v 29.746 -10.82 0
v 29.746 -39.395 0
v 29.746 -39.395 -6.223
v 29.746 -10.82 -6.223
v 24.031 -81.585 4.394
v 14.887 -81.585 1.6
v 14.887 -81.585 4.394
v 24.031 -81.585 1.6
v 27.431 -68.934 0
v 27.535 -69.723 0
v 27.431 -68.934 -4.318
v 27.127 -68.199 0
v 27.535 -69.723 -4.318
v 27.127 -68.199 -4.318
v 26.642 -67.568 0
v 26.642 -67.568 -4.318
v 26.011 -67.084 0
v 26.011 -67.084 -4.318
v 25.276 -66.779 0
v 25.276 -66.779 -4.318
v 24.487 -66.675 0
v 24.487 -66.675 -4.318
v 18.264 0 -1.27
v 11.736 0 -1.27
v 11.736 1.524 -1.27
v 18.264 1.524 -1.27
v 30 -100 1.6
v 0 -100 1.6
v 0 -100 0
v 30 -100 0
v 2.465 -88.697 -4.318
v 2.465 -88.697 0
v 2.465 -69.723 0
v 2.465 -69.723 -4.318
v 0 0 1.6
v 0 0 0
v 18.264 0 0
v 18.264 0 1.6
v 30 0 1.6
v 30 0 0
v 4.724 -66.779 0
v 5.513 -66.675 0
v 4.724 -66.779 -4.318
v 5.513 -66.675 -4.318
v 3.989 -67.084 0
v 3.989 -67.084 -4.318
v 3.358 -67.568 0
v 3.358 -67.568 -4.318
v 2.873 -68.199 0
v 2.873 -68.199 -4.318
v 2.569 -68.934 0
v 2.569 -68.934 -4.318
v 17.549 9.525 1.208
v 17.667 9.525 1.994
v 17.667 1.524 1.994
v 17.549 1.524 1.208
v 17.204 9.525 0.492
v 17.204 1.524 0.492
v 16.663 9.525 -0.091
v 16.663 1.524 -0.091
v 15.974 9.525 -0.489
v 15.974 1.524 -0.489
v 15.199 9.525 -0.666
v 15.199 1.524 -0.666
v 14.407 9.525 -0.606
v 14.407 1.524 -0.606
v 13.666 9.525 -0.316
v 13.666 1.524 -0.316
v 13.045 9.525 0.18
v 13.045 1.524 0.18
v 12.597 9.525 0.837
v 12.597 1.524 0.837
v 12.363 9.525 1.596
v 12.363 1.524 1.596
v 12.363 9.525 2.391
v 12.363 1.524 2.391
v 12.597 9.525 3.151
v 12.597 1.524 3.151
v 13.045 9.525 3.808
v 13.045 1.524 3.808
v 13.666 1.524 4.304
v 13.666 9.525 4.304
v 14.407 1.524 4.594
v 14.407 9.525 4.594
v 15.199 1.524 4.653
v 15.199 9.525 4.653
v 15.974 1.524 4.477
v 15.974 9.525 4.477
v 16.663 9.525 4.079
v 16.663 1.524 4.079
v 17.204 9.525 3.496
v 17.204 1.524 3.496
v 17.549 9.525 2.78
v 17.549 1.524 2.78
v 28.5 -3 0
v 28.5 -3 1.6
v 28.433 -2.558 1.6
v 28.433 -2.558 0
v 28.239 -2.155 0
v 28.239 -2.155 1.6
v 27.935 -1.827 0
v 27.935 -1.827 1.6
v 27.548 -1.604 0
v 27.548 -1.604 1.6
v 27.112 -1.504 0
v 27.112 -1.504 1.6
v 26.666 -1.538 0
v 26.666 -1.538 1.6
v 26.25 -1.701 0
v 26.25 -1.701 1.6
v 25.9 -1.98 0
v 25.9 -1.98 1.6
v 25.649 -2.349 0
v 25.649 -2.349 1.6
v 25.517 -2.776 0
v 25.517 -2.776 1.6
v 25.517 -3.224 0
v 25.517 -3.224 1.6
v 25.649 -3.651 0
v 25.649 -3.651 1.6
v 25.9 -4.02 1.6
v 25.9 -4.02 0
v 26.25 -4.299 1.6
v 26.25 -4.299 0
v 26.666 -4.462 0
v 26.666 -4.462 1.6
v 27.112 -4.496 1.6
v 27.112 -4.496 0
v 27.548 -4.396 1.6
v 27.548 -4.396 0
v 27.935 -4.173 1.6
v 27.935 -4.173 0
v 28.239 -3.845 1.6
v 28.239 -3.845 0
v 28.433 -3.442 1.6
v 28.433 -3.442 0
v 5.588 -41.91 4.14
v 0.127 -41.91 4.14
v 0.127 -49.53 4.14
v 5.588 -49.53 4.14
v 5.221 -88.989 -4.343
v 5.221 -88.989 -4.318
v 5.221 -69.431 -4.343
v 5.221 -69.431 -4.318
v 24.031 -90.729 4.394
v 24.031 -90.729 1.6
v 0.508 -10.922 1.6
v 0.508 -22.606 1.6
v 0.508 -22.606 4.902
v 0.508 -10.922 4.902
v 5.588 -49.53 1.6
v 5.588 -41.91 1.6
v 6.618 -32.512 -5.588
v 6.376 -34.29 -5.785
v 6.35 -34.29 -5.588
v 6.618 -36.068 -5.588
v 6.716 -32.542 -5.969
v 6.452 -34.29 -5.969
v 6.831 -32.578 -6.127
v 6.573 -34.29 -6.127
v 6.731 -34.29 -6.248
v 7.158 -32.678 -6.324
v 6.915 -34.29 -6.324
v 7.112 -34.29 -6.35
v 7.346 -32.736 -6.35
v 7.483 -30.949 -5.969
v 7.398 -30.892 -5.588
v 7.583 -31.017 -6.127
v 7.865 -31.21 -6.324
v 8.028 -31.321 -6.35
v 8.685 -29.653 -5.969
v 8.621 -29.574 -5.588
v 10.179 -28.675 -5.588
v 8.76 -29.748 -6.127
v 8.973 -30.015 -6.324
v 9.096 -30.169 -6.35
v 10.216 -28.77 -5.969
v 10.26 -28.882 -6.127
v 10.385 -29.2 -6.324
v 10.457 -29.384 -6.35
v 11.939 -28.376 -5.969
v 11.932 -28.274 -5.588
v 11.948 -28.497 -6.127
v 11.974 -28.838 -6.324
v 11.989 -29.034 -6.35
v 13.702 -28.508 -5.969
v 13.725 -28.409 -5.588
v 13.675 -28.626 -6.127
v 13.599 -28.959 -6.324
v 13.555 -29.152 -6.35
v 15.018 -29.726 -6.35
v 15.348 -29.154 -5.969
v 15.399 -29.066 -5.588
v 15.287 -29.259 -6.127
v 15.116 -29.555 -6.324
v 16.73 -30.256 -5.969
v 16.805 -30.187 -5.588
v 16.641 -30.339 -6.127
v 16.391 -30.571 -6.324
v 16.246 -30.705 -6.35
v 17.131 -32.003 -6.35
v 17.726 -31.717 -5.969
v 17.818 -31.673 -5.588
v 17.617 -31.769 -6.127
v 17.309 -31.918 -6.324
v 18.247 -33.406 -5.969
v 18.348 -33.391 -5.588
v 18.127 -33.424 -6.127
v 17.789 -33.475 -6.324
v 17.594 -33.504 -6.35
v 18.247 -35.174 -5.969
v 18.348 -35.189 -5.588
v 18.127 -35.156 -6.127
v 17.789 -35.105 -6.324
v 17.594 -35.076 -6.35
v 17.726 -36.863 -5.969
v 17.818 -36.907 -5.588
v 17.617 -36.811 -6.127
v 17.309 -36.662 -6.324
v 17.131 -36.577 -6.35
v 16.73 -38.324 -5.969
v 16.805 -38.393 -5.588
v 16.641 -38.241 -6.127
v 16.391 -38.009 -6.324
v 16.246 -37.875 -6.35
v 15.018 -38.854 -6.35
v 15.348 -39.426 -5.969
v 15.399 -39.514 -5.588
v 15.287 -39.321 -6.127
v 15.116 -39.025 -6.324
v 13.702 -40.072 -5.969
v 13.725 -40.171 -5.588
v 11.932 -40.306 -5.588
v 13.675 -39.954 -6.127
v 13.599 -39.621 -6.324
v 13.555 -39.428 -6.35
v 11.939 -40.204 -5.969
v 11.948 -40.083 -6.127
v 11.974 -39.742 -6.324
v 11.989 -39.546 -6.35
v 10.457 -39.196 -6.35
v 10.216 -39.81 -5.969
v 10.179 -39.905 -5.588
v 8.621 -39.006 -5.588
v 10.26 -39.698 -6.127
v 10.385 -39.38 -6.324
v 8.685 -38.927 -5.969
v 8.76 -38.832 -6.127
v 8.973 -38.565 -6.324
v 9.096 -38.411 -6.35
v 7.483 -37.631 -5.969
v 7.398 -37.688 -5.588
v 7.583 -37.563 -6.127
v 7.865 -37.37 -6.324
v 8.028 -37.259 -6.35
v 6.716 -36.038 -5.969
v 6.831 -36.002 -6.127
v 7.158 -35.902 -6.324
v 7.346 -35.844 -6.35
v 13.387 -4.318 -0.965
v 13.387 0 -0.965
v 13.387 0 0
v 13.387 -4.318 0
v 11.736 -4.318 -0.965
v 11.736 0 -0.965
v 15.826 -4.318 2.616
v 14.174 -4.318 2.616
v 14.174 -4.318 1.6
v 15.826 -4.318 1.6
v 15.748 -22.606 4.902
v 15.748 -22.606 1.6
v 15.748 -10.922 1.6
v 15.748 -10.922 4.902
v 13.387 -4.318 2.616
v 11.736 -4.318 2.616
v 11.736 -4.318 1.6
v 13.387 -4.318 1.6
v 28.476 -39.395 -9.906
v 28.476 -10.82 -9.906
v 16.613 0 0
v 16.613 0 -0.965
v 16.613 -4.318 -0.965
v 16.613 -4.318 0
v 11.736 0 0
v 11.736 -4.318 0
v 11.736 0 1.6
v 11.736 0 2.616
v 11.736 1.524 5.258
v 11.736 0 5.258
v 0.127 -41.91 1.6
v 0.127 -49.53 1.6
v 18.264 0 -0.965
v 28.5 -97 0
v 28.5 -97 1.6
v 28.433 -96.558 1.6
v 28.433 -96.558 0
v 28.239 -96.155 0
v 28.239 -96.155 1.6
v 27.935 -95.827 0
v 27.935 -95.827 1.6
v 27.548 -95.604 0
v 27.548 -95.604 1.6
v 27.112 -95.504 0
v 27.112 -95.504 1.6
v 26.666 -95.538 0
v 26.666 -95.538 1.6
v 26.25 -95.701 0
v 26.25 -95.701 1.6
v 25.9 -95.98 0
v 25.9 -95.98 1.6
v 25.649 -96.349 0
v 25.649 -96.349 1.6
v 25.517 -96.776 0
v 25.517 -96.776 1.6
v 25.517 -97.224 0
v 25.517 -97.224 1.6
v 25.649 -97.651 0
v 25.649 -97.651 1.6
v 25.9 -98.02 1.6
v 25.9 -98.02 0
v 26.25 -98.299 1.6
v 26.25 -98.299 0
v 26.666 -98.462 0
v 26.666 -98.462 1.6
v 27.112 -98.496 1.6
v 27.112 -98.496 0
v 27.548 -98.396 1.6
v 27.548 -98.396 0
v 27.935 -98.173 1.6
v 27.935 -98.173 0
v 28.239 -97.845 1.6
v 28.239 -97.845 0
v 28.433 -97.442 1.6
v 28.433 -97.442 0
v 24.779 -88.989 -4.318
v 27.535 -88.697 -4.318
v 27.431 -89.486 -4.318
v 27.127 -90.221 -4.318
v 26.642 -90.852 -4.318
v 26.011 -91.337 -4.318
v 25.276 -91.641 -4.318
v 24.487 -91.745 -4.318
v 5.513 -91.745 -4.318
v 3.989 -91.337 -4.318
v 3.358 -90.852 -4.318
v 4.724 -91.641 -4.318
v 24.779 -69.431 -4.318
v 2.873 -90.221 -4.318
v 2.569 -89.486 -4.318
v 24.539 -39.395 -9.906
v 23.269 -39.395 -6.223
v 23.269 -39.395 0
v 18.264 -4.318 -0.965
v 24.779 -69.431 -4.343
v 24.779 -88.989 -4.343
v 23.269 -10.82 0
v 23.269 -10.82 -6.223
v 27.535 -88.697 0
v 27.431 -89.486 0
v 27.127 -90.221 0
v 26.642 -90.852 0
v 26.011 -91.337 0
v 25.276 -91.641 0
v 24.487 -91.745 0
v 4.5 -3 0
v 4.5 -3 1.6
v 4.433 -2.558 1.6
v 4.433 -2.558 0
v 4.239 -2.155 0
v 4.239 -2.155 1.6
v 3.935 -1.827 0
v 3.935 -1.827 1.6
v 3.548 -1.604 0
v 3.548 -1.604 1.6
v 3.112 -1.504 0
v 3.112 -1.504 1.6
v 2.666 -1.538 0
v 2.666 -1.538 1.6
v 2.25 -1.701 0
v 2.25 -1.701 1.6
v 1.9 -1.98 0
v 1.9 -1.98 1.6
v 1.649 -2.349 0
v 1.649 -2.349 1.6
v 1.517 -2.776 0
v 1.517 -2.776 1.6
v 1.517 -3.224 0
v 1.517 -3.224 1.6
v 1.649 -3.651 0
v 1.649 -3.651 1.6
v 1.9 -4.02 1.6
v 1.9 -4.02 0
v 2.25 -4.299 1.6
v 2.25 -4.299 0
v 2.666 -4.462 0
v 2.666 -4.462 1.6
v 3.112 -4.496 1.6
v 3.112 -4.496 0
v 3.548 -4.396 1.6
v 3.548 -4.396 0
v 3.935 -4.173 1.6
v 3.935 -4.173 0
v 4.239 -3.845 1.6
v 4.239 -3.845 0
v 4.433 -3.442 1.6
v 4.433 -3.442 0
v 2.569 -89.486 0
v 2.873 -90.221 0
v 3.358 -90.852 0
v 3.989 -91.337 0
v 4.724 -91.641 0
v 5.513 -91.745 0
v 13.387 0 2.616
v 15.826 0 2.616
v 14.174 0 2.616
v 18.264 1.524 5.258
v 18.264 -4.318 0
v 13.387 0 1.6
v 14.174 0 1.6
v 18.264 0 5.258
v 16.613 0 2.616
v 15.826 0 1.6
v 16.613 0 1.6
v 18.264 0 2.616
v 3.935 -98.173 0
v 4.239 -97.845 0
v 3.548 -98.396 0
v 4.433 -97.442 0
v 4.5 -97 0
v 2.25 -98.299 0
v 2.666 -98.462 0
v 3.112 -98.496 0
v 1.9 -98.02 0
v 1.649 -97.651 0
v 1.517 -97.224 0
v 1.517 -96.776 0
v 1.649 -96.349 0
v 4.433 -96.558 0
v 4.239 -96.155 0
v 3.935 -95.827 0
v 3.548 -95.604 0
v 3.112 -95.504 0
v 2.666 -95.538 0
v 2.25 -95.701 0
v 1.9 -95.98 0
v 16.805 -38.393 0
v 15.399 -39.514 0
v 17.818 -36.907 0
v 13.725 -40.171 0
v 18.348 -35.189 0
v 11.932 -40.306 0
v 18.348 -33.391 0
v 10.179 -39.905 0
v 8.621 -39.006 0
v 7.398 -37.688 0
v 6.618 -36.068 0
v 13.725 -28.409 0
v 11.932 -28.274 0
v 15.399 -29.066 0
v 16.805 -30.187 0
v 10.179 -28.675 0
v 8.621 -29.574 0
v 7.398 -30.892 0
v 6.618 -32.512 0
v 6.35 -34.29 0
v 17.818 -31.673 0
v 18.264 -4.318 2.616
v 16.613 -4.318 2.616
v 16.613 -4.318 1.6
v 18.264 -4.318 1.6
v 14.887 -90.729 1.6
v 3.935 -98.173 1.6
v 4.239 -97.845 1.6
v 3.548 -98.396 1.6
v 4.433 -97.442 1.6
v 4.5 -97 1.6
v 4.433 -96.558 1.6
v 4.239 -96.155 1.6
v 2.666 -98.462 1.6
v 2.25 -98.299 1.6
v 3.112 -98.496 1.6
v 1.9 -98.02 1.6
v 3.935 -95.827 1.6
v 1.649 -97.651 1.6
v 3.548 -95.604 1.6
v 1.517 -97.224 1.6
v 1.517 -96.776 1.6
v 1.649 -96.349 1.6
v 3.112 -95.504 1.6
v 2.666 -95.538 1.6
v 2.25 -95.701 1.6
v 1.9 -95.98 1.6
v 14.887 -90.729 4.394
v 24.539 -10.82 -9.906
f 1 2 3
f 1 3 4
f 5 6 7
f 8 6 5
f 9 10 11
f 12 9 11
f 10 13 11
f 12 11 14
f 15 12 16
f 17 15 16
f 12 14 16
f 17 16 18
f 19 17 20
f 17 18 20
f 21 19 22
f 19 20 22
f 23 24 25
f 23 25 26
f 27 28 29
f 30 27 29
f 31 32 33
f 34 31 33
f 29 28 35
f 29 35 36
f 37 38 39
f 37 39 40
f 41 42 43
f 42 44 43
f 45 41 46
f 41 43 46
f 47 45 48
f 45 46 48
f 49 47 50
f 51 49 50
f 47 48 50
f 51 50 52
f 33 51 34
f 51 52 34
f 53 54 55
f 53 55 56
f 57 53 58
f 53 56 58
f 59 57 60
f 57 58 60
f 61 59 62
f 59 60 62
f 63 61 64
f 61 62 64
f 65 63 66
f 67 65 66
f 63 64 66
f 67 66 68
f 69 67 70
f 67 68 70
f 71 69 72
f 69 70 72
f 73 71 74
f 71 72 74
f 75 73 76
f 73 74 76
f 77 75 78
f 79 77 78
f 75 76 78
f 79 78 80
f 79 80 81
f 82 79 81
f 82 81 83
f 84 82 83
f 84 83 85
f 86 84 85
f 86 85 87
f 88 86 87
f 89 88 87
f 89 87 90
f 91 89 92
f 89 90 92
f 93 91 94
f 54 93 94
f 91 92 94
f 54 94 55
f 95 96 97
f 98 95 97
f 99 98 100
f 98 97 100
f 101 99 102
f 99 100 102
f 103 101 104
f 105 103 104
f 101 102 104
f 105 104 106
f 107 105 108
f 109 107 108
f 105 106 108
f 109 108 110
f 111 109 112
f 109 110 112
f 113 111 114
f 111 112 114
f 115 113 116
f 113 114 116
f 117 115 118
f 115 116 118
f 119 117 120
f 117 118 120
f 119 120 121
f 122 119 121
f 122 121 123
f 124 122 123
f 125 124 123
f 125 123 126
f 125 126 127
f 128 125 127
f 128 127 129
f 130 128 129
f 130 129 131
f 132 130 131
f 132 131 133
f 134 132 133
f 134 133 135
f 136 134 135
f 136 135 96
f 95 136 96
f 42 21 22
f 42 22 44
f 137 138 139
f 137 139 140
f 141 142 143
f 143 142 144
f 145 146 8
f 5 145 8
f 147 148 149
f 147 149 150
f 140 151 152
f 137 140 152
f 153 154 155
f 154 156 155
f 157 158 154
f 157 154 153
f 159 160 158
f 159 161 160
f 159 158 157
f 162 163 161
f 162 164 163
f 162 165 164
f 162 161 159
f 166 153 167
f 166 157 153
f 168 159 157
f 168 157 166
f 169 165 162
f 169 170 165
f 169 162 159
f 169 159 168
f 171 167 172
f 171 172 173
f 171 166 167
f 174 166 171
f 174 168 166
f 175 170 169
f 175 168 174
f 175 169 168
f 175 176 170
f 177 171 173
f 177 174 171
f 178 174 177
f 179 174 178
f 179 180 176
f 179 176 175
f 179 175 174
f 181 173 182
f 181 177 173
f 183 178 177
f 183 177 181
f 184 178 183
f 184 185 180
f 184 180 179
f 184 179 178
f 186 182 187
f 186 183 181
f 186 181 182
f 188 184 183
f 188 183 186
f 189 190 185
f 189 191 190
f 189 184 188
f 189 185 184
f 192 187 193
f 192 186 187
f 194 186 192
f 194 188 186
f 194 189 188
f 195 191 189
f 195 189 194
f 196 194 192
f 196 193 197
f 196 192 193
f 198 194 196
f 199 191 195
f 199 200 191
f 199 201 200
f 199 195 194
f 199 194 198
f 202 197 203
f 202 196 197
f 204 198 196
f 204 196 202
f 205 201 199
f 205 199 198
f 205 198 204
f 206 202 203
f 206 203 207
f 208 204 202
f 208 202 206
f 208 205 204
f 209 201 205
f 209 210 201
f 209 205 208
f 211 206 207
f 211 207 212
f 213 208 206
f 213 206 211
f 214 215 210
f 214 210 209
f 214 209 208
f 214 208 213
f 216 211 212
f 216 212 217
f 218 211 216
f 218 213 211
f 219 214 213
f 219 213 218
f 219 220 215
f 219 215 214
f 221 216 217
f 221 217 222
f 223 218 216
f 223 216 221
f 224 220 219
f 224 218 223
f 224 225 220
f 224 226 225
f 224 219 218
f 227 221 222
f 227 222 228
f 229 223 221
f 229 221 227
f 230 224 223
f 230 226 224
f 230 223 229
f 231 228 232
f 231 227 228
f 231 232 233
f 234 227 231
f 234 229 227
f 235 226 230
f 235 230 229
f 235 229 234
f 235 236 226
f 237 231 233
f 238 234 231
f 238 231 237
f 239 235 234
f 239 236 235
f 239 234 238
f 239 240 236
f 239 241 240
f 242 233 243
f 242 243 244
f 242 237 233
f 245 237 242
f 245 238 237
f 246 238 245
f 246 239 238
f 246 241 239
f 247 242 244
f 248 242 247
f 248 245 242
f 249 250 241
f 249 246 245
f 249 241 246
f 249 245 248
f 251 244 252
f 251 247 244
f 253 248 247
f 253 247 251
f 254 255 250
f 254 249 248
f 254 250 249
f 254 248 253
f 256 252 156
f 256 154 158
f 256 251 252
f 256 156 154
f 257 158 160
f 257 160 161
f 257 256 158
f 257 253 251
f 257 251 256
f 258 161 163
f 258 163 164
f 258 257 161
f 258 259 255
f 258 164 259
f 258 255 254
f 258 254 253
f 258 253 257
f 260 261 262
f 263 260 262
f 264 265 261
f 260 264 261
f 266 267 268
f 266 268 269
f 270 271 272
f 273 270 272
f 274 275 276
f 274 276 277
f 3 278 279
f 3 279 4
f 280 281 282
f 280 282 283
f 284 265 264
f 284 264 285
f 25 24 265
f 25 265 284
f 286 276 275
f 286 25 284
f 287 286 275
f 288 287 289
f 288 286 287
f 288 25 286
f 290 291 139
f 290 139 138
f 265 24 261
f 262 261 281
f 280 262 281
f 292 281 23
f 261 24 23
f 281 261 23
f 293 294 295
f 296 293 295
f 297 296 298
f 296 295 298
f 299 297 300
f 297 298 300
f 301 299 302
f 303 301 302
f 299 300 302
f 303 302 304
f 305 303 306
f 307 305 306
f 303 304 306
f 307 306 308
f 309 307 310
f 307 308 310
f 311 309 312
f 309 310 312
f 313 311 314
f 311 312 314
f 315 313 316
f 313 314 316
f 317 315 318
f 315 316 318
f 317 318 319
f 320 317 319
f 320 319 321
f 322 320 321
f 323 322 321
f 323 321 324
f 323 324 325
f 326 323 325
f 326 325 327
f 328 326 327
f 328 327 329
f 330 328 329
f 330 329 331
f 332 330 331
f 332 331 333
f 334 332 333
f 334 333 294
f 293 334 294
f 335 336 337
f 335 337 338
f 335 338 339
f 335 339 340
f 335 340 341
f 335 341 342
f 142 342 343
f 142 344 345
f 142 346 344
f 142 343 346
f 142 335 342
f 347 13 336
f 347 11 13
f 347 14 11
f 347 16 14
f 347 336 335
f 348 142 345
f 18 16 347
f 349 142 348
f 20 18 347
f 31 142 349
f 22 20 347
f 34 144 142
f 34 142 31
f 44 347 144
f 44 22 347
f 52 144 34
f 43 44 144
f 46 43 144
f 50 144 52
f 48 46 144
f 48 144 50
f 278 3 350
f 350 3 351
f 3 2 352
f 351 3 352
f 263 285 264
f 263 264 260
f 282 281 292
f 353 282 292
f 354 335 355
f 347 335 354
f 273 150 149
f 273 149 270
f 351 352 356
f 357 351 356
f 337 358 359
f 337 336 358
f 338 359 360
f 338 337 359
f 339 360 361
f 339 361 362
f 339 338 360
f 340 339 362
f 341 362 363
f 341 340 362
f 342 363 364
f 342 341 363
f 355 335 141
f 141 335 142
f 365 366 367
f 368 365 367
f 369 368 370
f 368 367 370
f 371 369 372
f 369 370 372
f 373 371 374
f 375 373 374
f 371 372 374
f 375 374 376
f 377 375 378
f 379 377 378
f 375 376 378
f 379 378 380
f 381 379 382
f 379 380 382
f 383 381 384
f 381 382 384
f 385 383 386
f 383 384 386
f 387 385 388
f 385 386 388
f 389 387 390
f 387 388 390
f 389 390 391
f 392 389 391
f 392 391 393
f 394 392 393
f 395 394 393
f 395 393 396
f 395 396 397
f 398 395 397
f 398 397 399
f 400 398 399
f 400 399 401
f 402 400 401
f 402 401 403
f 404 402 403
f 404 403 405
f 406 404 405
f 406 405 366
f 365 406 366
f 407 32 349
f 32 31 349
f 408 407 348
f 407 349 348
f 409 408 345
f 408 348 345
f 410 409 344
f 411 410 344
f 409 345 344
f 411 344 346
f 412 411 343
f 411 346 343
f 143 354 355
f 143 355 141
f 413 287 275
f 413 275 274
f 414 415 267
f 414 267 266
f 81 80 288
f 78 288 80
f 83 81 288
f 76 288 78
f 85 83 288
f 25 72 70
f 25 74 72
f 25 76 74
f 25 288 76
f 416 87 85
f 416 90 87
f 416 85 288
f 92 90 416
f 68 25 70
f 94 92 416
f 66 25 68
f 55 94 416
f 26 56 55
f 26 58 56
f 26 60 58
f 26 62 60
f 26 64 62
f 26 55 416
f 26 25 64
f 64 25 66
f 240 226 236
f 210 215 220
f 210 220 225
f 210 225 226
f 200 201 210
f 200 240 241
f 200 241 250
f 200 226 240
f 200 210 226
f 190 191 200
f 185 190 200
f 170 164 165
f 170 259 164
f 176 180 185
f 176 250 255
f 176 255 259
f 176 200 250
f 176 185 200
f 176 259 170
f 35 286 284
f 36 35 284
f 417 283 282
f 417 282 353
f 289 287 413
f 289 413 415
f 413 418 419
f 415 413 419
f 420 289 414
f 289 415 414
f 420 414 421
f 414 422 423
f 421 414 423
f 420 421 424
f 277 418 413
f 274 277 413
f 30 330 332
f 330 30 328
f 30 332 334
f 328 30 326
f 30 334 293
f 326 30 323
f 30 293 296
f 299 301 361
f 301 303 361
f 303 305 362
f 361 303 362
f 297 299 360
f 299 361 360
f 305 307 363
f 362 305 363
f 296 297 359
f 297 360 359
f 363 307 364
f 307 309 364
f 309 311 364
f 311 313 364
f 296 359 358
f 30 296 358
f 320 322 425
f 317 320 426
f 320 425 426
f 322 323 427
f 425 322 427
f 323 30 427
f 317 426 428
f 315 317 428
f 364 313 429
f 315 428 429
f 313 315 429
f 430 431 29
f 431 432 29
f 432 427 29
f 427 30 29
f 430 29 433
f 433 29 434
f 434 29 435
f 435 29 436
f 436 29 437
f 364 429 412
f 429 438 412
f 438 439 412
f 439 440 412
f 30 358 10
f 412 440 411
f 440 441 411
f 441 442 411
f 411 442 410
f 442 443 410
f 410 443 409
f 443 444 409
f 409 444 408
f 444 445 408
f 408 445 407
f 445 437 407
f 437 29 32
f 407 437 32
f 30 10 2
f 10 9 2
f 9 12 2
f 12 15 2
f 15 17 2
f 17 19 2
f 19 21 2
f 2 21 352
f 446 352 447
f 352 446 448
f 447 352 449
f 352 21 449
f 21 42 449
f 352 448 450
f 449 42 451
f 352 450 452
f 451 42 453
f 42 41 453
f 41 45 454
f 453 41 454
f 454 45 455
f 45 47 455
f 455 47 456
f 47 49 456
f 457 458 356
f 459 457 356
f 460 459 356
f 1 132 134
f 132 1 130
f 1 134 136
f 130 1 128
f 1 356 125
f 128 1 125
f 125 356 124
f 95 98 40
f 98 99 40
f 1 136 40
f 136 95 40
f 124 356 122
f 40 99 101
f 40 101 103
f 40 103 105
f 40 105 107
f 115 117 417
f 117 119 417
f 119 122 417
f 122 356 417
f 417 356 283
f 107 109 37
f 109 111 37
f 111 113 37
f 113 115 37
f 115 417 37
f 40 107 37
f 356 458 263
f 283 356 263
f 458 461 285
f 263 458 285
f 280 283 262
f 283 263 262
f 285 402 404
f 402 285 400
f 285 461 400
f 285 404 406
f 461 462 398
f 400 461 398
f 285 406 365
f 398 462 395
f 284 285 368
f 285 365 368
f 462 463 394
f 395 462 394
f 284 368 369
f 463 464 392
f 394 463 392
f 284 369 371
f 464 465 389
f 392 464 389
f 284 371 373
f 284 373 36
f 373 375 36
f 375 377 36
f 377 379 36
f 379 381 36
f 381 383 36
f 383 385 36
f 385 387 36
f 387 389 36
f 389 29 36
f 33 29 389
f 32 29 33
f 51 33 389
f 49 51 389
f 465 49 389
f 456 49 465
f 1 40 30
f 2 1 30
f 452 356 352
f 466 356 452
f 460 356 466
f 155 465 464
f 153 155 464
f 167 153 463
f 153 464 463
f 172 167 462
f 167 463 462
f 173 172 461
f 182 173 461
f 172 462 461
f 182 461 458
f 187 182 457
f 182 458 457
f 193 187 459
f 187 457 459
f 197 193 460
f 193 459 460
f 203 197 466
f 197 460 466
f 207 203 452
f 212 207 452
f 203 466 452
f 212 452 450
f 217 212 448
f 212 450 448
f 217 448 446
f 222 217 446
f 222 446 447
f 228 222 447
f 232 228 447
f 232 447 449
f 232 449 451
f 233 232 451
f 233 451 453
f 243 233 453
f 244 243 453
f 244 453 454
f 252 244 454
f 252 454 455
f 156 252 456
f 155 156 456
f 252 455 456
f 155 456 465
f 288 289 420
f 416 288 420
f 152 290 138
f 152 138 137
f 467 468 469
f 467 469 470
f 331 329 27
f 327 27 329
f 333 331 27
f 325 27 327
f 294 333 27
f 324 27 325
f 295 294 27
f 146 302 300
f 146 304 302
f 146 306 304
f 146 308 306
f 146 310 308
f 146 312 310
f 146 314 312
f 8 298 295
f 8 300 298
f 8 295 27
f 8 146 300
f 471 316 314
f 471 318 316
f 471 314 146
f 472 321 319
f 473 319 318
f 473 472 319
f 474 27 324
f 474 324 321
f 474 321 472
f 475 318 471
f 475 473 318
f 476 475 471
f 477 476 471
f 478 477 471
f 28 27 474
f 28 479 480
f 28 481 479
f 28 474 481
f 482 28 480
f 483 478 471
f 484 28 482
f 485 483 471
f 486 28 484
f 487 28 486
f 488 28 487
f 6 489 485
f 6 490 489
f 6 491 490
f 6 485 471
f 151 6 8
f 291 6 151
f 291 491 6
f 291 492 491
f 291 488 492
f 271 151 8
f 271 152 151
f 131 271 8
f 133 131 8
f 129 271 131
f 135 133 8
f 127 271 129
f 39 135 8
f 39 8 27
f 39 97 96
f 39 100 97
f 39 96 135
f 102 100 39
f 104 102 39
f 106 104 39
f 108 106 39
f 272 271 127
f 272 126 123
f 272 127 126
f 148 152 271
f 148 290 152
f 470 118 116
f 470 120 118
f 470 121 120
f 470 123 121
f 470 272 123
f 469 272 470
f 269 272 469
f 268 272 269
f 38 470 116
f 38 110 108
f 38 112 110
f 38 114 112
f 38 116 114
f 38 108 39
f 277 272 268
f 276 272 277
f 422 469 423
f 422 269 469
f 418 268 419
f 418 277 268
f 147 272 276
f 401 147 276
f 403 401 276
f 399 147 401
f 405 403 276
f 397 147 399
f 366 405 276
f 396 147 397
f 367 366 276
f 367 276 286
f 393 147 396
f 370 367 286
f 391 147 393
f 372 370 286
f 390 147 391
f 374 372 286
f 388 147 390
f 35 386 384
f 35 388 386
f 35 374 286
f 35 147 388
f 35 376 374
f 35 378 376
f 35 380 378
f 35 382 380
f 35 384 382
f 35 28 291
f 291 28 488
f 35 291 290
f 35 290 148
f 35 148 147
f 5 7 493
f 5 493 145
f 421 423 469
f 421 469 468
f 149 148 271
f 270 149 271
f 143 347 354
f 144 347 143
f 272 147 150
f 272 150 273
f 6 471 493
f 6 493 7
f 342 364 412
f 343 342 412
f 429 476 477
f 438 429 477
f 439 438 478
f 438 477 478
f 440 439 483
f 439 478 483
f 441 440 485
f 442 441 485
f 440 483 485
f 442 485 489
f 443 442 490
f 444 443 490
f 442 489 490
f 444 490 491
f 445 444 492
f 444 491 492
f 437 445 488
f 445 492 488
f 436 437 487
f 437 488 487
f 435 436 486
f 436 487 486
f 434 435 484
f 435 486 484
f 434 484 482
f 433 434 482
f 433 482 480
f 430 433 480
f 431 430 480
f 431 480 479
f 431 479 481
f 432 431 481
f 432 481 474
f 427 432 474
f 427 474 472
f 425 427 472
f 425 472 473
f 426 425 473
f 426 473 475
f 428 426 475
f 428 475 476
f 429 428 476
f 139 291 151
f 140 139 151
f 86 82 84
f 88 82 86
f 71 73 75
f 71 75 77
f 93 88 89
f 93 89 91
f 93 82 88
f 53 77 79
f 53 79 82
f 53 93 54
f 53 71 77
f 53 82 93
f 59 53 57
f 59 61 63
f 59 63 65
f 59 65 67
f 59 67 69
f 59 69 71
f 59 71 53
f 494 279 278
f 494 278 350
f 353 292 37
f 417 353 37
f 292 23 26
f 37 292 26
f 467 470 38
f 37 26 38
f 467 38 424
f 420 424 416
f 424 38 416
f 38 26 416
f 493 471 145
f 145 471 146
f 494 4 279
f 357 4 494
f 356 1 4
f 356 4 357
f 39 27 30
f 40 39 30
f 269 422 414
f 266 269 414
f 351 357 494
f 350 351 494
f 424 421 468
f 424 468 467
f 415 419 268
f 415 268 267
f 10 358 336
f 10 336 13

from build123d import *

# Parameters (mm, degrees)
SKETCH3_W            = 1.6002
SKETCH3_H            = 100
BOSS_EXTRUDE1_DEPTH  = 30
SKETCH5_R            = 1.5
SCREW_HOLES_DEPTH    = 13.39
SKETCH7_W            = 6.477
SKETCH7_H            = 28.575
BOSS_EXTRUDE2_DEPTH  = 9.906
CUT_EXTRUDE1_REACH   = 91.18
SKETCH9_R            = 6.0325
BOSS_EXTRUDE3_DEPTH  = 6.35
FILLET1_R            = 0.762
SKETCH10_W           = 25.0698
SKETCH10_H           = 25.0698
BOSS_EXTRUDE4_DEPTH  = 4.318
FILLET2_R            = 3.048
SKETCH11_W           = 19.558
SKETCH11_H           = 19.558
STICKER_DEPTH        = 0.0254
SKETCH12_W           = 15.24
SKETCH12_H           = 11.684
BIG_CHIP_DEPTH       = 3.302
SKETCH13_W           = 9.144
SKETCH13_H           = 9.144
UBLOX_CHIP_DEPTH     = 2.794
SKETCH14_W           = 6.5278
SKETCH14_H           = 6.5278
BOSS_EXTRUDE8_DEPTH  = 1.524
SKETCH15_R           = 2.667
BOSS_EXTRUDE9_DEPTH  = 8.001
SKETCH17_W           = 1.651
SKETCH17_H           = 1.016
BOSS_EXTRUDE10_DEPTH = 4.318
SKETCH18_W           = 1.651
SKETCH18_H           = 0.9652
BOSS_EXTRUDE11_DEPTH = 4.318
SKETCH19_W           = 5.461
SKETCH19_H           = 7.62
USB_CONNECTOR_DEPTH  = 2.54


with BuildPart() as part:
    # Sketch3 → Boss-Extrude1 (new body)
    with BuildSketch(Plane(origin=(0, 0, 0), x_dir=(0, 0, -1), z_dir=(1, 0, 0))):
        with Locations((-0.8001, -50)):
            Rectangle(SKETCH3_W, SKETCH3_H)
    extrude(amount=BOSS_EXTRUDE1_DEPTH)

    # Sketch5 → Screw-Holes (cut)
    with BuildSketch(Plane.XY.offset(1.6002)):
        with Locations((27, -3)):
            Circle(SKETCH5_R)
        with Locations((3, -3)):
            Circle(SKETCH5_R)
        with Locations((3, -97)):
            Circle(SKETCH5_R)
        with Locations((27, -97)):
            Circle(SKETCH5_R)
    extrude(amount=-SCREW_HOLES_DEPTH, mode=Mode.SUBTRACT)

    # Sketch7 → Boss-Extrude2 (add)
    with BuildSketch(Plane(origin=(0, 0, 0), x_dir=(-1, 0, 0), z_dir=(0, 0, -1))):
        with Locations((-26.5075, -25.1079)):
            Rectangle(SKETCH7_W, SKETCH7_H)
    extrude(amount=BOSS_EXTRUDE2_DEPTH)

    # Sketch8 → Cut-Extrude1 (cut, up to next)
    with BuildSketch(Plane(origin=(0, -10.8204, 0), x_dir=(1, 0, 0), z_dir=(0, 1, 0)), mode=Mode.PRIVATE) as cut_extrude1_sk1:
        Polygon((28.476, 9.906), (29.746, 6.223), (29.746, 9.906), align=None)
    cut_extrude1_tool1 = extrude(cut_extrude1_sk1.sketch, amount=-CUT_EXTRUDE1_REACH, mode=Mode.PRIVATE) & part.part
    add(cut_extrude1_tool1.solids().sort_by_distance((29.322667, -10.8204, -8.678333))[0], mode=Mode.SUBTRACT)
    # Sketch8 → Cut-Extrude1 (cut, up to next)
    with BuildSketch(Plane(origin=(0, -10.8204, 0), x_dir=(1, 0, 0), z_dir=(0, 1, 0)), mode=Mode.PRIVATE) as cut_extrude1_sk2:
        Polygon((23.269, 9.906), (23.269, 6.223), (24.539, 9.906), align=None)
    cut_extrude1_tool2 = extrude(cut_extrude1_sk2.sketch, amount=-CUT_EXTRUDE1_REACH, mode=Mode.PRIVATE) & part.part
    add(cut_extrude1_tool2.solids().sort_by_distance((23.692333, -10.8204, -8.678333))[0], mode=Mode.SUBTRACT)

    # Sketch9 → Boss-Extrude3 (add)
    with BuildSketch(Plane(origin=(0, 0, 0), x_dir=(-1, 0, 0), z_dir=(0, 0, -1))):
        with Locations((-12.3825, -34.29)):
            Circle(SKETCH9_R)
    extrude(amount=BOSS_EXTRUDE3_DEPTH)

    # Fillet1
    fillet1_edges = [part.edges().sort_by_distance(p)[0] for p in [
        (18.415, -34.29, -6.35),
    ]]
    fillet(fillet1_edges, radius=FILLET1_R)

    # Sketch10 → Boss-Extrude4 (add)
    with BuildSketch(Plane(origin=(0, 0, 0), x_dir=(-1, 0, 0), z_dir=(0, 0, -1))):
        with Locations((-15, -79.2101)):
            Rectangle(SKETCH10_W, SKETCH10_H)
    extrude(amount=BOSS_EXTRUDE4_DEPTH)

    # Fillet2
    fillet2_edges = [part.edges().sort_by_distance(p)[0] for p in [
        (2.4651, -91.745, -2.159),
        (2.4651, -66.6752, -2.159),
        (27.5349, -66.6752, -2.159),
        (27.5349, -91.745, -2.159),
    ]]
    fillet(fillet2_edges, radius=FILLET2_R)

    # Sketch11 → Sticker (add)
    with BuildSketch(Plane(origin=(0, 0, -4.318), x_dir=(-1, 0, 0), z_dir=(0, 0, -1))):
        with Locations((-15, -79.2101)):
            Rectangle(SKETCH11_W, SKETCH11_H)
    extrude(amount=STICKER_DEPTH)

    # Sketch12 → Big chip (add)
    with BuildSketch(Plane.XY.offset(1.6002)):
        with Locations((8.128, -16.764)):
            Rectangle(SKETCH12_W, SKETCH12_H)
    extrude(amount=BIG_CHIP_DEPTH)

    # Sketch13 → ublox chip (add)
    with BuildSketch(Plane.XY.offset(1.6002)):
        with Locations((19.459, -86.157)):
            Rectangle(SKETCH13_W, SKETCH13_H)
    extrude(amount=UBLOX_CHIP_DEPTH)

    # Sketch14 → Boss-Extrude8 (add)
    with BuildSketch(Plane(origin=(0, 0, 0), x_dir=(1, 0, 0), z_dir=(0, 1, 0))):
        with Locations((15, -1.9939)):
            Rectangle(SKETCH14_W, SKETCH14_H)
    extrude(amount=BOSS_EXTRUDE8_DEPTH)

    # Sketch15 → Boss-Extrude9 (add)
    with BuildSketch(Plane(origin=(0, 1.524, 0), x_dir=(1, 0, 0), z_dir=(0, 1, 0))):
        with Locations((15, -1.9939)):
            Circle(SKETCH15_R)
    extrude(amount=BOSS_EXTRUDE9_DEPTH)

    # Sketch17 → Boss-Extrude10 (add)
    with BuildSketch(Plane.XZ):
        with Locations((15, 2.1082)):
            Rectangle(SKETCH17_W, SKETCH17_H)
        with Locations((12.5616, 2.1082)):
            Rectangle(SKETCH17_W, SKETCH17_H)
        with Locations((17.4384, 2.1082)):
            Rectangle(SKETCH17_W, SKETCH17_H)
    extrude(amount=BOSS_EXTRUDE10_DEPTH)

    # Sketch18 → Boss-Extrude11 (add)
    with BuildSketch(Plane.XZ):
        with Locations((12.5616, -0.4826)):
            Rectangle(SKETCH18_W, SKETCH18_H)
        with Locations((17.4384, -0.4826)):
            Rectangle(SKETCH18_W, SKETCH18_H)
    extrude(amount=BOSS_EXTRUDE11_DEPTH)

    # Sketch19 → USB connector (add)
    with BuildSketch(Plane.XY.offset(1.6002)):
        with Locations((2.8575, -45.72)):
            Rectangle(SKETCH19_W, SKETCH19_H)
    extrude(amount=USB_CONNECTOR_DEPTH)


solid = part.part
